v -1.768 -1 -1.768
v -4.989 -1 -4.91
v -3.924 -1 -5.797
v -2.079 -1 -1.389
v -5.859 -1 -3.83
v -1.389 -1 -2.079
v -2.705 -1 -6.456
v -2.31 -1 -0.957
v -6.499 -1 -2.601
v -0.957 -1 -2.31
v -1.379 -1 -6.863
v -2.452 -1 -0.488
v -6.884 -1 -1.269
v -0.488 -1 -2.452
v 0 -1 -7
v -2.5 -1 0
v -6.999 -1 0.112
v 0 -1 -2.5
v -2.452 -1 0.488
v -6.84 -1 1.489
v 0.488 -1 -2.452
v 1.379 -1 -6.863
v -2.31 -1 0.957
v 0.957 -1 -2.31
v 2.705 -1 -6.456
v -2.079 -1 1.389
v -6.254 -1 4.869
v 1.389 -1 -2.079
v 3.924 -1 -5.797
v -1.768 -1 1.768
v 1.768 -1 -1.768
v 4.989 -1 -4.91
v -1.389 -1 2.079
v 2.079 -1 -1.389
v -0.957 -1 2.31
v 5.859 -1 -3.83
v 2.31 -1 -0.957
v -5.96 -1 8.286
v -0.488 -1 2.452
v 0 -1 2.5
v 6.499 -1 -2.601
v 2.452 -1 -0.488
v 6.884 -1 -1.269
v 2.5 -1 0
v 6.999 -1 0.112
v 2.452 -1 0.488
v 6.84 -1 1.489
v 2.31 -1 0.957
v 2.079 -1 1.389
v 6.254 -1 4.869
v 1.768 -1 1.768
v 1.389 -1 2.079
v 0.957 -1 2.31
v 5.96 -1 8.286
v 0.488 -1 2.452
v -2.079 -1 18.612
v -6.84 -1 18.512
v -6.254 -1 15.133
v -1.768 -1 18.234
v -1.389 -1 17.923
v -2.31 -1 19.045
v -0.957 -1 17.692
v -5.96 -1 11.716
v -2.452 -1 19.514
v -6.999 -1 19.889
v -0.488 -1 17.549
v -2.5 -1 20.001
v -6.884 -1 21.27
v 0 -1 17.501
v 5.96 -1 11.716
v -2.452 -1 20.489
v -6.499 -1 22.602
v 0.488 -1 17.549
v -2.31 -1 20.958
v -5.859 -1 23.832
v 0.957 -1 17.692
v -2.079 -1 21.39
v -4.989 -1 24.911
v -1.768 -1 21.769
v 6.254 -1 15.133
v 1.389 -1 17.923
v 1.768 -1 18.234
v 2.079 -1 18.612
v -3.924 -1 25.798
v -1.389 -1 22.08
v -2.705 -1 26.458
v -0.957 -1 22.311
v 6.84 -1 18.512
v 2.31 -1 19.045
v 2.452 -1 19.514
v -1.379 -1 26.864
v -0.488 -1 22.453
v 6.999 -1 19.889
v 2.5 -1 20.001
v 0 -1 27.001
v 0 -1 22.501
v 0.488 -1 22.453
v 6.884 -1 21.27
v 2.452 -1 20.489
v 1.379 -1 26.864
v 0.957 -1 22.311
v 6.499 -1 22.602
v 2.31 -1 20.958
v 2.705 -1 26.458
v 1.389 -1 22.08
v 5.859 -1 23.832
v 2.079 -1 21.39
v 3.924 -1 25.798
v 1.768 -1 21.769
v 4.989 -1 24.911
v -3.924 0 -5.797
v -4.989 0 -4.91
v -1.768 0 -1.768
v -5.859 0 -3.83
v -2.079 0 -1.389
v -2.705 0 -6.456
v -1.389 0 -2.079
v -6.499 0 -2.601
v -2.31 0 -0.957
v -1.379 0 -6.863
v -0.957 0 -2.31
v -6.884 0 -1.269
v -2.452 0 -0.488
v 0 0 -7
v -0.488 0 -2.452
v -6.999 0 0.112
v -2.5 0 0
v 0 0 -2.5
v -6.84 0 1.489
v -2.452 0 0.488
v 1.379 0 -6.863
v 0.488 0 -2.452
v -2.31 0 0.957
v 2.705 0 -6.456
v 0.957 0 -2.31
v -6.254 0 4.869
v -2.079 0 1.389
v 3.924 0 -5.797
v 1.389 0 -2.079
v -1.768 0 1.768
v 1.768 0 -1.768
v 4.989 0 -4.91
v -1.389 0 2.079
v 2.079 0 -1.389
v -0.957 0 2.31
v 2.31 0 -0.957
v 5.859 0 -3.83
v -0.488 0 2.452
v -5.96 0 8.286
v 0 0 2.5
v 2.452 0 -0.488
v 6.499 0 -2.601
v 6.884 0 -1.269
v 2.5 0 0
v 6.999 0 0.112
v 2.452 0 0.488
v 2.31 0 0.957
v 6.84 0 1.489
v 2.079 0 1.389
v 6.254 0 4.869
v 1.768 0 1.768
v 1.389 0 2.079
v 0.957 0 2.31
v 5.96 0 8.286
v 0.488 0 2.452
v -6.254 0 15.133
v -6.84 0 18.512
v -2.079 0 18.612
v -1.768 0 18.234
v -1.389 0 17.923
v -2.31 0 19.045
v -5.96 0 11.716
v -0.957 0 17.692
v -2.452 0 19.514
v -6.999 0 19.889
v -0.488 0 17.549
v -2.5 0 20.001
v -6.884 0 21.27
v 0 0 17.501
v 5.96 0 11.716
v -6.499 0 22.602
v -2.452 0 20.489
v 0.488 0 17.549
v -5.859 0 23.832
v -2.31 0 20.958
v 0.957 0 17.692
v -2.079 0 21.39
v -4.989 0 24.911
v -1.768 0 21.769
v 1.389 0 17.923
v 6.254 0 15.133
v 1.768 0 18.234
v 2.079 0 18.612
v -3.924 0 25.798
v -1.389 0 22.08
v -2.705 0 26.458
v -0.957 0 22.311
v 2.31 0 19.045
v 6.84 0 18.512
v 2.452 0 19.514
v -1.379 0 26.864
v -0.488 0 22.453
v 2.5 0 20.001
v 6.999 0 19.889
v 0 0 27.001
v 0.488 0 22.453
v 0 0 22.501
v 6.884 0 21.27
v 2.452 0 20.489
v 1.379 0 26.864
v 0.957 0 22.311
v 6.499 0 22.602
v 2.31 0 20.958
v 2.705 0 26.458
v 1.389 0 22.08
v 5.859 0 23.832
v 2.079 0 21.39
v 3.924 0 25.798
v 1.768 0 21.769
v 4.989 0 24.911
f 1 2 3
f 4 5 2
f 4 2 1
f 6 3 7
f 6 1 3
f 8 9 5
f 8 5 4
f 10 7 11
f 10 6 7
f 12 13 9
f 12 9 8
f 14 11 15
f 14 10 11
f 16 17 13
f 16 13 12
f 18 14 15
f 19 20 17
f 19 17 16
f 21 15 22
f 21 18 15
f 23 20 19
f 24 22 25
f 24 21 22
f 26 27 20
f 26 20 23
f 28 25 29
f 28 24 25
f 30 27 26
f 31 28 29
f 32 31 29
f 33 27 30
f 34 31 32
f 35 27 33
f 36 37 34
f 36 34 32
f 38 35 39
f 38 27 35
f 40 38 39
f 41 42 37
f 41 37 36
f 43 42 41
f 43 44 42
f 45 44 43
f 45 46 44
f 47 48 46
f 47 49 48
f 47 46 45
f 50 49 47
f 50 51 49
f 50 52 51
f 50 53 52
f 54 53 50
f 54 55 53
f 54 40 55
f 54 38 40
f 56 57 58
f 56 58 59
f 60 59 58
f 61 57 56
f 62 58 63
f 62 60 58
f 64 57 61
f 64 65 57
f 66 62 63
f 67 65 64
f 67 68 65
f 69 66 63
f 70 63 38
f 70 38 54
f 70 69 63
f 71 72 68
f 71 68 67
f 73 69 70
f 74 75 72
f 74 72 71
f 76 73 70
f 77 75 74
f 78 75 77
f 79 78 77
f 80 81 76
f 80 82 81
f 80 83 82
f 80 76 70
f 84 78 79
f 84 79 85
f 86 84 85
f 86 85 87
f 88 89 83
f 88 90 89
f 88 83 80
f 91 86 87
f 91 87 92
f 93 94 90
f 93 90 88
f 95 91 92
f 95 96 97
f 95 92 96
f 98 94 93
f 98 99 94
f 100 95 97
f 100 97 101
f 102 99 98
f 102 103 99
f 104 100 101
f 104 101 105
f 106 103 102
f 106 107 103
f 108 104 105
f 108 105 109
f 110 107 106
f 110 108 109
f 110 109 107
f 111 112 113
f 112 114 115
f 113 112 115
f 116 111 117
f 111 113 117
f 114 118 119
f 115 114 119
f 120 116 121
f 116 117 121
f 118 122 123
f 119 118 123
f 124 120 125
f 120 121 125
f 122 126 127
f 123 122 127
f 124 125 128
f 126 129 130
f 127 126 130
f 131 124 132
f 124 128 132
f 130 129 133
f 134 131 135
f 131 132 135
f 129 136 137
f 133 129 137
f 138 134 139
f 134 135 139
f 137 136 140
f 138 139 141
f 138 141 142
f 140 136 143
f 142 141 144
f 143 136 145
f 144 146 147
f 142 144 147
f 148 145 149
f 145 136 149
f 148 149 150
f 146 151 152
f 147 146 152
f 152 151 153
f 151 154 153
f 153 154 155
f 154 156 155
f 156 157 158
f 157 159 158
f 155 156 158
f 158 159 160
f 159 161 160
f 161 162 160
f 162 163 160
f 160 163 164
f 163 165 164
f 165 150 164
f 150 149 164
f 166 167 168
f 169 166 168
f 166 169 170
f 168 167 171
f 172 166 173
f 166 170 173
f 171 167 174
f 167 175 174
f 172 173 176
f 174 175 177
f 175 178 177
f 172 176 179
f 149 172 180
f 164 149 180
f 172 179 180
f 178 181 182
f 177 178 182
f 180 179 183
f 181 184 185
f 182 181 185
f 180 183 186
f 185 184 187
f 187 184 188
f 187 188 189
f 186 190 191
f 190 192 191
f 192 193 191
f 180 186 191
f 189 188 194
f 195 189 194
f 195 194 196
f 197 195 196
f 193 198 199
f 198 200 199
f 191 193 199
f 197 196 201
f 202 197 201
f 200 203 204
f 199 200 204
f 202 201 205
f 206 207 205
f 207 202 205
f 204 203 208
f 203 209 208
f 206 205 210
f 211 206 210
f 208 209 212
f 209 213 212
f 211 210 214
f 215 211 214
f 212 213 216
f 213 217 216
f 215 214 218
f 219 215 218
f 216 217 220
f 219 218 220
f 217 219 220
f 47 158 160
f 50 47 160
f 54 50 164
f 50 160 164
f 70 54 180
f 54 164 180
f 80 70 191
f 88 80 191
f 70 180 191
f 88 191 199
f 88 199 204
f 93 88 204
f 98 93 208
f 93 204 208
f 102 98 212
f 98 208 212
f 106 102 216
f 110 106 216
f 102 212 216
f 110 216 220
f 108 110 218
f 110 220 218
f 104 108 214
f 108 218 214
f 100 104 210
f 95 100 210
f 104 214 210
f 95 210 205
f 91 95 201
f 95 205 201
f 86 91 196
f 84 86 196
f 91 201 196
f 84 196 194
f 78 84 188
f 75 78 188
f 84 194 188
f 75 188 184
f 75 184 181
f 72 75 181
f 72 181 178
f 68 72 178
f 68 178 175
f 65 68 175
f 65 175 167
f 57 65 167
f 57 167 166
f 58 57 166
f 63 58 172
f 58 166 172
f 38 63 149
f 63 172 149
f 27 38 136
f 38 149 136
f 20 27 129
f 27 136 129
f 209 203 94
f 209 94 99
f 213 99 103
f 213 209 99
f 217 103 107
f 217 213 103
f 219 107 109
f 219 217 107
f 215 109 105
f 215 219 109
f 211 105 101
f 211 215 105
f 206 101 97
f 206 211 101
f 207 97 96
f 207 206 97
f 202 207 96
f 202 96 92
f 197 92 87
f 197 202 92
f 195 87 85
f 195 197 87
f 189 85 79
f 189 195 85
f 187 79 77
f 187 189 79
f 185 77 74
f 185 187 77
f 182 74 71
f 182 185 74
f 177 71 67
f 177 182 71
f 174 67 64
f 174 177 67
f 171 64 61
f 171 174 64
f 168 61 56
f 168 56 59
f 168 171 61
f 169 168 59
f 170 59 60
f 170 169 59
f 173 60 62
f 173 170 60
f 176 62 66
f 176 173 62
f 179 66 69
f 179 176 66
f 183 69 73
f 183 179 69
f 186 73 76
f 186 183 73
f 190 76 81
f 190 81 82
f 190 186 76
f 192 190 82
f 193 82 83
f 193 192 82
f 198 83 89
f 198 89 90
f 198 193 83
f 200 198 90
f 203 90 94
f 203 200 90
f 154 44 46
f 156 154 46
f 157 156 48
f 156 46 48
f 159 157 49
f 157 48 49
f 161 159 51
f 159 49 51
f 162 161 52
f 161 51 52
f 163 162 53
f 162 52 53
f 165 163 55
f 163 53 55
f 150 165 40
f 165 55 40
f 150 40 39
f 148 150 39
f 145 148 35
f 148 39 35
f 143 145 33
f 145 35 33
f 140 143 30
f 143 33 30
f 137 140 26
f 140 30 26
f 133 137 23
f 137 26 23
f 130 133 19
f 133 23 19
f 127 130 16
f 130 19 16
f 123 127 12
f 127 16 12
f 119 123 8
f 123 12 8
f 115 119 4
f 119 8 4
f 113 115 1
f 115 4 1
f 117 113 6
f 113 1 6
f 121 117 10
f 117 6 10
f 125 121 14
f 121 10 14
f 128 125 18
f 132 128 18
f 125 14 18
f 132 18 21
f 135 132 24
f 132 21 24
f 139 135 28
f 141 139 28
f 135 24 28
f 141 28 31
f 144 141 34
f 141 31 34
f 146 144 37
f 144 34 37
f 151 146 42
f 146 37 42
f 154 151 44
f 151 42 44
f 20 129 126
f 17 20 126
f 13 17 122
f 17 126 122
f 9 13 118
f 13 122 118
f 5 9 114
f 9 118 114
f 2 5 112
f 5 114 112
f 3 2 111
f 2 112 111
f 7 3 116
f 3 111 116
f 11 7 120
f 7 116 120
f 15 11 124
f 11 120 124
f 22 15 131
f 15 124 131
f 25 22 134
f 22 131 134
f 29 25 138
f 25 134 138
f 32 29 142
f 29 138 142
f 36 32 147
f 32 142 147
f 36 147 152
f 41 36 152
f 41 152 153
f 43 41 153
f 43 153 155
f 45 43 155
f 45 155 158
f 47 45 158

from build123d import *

# Parameters (mm, degrees)
F0_R     = 2.5
F1_DEPTH = 1
F2_R     = 2.5
F3_DEPTH = 1


with BuildPart() as f1:
    # F0 (on Front) → F1 (new body)
    with BuildSketch(Plane.XZ):
        with BuildLine():
            ThreePointArc((-6.8397, 18.511913), (-5.9237, 10.000689), (-6.8397, 1.489464))
            ThreePointArc((-6.8397, 1.489464), (0, -7), (6.8397, 1.489464))
            ThreePointArc((6.8397, 1.489464), (5.9237, 10.000689), (6.8397, 18.511913))
            ThreePointArc((6.8397, 18.511913), (0, 27.001378), (-6.8397, 18.511913))
        make_face()
        with Locations((0, 20.001378)):
            Circle(F0_R, mode=Mode.SUBTRACT)
    extrude(amount=F1_DEPTH)

    # F2 (on face) → F3 (cut)
    with BuildSketch(Plane.XZ.offset(1)):
        Circle(F2_R)
    extrude(amount=-F3_DEPTH, mode=Mode.SUBTRACT)


solid = f1.part
